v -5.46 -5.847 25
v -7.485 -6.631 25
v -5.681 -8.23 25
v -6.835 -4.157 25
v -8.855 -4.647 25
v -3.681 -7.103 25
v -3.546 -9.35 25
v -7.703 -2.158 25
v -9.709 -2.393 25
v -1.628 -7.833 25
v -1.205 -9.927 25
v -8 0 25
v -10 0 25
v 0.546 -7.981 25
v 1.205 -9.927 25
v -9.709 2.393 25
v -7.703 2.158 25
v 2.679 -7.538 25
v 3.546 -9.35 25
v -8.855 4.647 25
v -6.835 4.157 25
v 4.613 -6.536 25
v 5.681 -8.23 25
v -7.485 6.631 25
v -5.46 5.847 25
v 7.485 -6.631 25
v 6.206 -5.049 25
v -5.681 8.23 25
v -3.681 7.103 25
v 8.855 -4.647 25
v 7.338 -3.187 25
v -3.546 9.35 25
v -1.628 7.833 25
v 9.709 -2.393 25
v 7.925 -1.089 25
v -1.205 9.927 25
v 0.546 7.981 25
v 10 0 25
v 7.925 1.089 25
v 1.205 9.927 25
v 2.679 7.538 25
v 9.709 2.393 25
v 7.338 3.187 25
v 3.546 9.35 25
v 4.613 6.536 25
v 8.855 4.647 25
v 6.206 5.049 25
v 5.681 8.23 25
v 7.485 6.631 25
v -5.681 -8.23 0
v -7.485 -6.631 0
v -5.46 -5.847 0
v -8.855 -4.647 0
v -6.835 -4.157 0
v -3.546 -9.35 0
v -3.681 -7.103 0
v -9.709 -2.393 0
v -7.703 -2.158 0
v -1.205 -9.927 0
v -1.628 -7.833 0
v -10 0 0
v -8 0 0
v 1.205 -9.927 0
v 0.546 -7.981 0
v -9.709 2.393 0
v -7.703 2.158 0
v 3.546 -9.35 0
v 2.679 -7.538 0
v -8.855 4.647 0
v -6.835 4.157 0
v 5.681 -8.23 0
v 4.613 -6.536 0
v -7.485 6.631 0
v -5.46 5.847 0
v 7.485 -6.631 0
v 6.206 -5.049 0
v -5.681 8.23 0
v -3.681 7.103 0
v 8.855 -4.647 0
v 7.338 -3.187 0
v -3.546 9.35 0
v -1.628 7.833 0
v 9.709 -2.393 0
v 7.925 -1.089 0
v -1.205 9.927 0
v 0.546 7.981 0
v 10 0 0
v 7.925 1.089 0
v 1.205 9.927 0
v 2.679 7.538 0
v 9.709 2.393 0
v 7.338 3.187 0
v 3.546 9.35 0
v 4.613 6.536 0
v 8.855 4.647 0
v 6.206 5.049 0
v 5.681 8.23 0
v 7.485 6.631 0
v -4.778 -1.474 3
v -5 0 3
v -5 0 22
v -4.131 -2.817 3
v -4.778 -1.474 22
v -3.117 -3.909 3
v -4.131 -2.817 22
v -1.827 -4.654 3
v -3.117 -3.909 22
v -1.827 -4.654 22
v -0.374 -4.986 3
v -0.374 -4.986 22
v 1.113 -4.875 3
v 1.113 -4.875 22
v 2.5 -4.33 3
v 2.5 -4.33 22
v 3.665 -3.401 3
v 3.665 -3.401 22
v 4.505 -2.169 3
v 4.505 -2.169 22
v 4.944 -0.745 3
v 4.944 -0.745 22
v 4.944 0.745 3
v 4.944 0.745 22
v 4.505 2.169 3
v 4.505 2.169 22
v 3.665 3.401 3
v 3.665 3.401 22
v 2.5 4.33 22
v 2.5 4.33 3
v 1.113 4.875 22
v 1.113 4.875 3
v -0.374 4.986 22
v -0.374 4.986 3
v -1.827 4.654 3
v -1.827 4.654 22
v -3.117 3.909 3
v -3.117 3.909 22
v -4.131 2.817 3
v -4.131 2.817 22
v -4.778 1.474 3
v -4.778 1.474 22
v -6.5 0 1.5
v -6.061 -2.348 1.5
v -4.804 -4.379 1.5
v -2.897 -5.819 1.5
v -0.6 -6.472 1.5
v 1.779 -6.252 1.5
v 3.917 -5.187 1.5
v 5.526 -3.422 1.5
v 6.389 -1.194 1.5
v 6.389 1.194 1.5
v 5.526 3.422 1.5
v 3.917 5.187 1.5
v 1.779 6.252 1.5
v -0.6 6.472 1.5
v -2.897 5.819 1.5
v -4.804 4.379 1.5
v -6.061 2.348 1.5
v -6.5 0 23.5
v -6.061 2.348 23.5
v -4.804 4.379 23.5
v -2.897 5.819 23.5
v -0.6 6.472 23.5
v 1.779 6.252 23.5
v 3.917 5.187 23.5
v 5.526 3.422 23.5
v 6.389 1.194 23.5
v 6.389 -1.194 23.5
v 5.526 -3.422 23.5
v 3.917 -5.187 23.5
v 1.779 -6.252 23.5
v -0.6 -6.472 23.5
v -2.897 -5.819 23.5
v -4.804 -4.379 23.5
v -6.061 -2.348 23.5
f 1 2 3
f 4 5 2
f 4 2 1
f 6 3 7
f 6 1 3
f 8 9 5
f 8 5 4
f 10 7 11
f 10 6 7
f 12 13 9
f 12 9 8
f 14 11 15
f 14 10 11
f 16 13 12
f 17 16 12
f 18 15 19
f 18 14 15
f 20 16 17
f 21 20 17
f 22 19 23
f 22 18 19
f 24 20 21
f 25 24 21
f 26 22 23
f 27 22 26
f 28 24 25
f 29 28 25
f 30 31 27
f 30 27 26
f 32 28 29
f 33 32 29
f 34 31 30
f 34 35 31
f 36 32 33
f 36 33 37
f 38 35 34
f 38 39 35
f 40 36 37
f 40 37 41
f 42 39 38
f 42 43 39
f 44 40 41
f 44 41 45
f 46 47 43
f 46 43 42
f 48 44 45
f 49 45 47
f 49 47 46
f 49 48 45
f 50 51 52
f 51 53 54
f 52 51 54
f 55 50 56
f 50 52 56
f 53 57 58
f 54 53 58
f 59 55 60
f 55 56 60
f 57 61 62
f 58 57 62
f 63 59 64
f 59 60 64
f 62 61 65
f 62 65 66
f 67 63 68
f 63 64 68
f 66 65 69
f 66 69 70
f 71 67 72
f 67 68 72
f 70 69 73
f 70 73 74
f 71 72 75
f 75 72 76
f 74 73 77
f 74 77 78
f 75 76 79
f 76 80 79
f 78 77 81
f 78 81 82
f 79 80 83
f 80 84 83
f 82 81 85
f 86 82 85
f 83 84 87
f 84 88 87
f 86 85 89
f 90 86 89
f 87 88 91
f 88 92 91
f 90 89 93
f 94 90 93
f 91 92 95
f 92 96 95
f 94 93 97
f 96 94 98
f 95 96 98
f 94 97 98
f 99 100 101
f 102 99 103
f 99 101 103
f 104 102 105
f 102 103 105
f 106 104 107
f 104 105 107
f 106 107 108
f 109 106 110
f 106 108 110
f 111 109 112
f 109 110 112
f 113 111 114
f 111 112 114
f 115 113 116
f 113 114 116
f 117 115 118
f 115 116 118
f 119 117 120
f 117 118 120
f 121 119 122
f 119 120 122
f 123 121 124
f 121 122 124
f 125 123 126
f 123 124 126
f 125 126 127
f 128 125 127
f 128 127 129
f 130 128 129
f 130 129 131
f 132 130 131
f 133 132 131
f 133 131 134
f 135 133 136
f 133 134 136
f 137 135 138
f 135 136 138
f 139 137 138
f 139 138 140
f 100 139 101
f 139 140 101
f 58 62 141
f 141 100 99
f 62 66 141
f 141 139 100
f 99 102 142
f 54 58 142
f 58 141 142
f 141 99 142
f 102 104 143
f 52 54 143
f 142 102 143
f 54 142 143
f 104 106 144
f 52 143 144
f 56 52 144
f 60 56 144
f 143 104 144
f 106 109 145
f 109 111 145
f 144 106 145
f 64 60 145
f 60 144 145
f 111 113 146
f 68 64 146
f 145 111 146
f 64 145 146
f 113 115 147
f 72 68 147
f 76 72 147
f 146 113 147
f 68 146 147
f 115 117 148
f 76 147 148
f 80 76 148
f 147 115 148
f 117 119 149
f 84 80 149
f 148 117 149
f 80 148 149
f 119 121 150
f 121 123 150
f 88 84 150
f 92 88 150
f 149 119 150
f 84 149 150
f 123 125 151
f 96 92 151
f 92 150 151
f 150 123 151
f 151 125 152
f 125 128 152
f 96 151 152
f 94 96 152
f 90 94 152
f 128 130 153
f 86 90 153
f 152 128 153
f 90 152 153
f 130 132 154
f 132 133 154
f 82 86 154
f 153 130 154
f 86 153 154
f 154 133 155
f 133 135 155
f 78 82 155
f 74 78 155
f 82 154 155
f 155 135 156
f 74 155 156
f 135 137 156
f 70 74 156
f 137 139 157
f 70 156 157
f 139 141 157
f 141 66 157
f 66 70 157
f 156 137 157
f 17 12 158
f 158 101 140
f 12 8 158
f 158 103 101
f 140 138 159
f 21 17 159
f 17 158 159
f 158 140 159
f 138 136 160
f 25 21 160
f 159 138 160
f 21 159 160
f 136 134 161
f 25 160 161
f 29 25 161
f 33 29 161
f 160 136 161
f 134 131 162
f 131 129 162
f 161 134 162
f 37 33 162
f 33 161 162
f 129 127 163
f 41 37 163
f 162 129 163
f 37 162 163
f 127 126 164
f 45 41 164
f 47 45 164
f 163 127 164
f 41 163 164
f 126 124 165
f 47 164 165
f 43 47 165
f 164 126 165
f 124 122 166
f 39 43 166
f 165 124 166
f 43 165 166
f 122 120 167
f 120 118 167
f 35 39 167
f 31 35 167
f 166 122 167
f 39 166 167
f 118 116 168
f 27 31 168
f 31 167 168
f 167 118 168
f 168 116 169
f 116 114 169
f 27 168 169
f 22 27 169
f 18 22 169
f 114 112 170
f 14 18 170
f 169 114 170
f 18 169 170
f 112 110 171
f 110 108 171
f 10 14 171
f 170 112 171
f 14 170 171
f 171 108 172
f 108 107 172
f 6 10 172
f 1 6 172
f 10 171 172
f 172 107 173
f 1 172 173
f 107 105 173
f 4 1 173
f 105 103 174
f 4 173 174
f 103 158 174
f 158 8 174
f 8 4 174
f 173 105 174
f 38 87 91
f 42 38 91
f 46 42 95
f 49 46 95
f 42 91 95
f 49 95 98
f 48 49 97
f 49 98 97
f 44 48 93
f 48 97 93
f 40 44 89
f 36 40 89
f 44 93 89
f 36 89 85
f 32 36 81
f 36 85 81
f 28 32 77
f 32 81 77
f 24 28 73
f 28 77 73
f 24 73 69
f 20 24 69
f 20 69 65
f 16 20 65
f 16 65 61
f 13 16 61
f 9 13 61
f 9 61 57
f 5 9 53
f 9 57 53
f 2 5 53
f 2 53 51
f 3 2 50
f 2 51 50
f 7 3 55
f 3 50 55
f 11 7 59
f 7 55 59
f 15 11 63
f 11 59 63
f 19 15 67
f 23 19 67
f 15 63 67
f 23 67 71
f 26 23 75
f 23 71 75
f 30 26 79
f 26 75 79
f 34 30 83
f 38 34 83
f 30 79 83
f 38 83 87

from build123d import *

# Parameters (mm, degrees)
F0_R           = 10
F1_DEPTH       = 25
F3_D           = 10
F3_DEPTH       = 15
F3_CSINK_D     = 16
F3_CSINK_ANGLE = 90
F5_D           = 10
F5_DEPTH       = 15
F5_CSINK_D     = 16
F5_CSINK_ANGLE = 90


with BuildPart() as f1:
    # F0 (on Top) → F1 (new body)
    with BuildSketch(Plane.XY):
        Circle(F0_R)
    extrude(amount=F1_DEPTH)

    # F3
    with Locations(Plane.XY.offset(25)):
        with Locations((0, 0)):
            CounterSinkHole(F3_D / 2, F3_CSINK_D / 2, depth=F3_DEPTH, counter_sink_angle=F3_CSINK_ANGLE)

    # F5
    with Locations(Plane(origin=(0, 0, 0), x_dir=(1, 0, 0), z_dir=(0, 0, -1))):
        with Locations((0, 0)):
            CounterSinkHole(F5_D / 2, F5_CSINK_D / 2, depth=F5_DEPTH, counter_sink_angle=F5_CSINK_ANGLE)


solid = f1.part
